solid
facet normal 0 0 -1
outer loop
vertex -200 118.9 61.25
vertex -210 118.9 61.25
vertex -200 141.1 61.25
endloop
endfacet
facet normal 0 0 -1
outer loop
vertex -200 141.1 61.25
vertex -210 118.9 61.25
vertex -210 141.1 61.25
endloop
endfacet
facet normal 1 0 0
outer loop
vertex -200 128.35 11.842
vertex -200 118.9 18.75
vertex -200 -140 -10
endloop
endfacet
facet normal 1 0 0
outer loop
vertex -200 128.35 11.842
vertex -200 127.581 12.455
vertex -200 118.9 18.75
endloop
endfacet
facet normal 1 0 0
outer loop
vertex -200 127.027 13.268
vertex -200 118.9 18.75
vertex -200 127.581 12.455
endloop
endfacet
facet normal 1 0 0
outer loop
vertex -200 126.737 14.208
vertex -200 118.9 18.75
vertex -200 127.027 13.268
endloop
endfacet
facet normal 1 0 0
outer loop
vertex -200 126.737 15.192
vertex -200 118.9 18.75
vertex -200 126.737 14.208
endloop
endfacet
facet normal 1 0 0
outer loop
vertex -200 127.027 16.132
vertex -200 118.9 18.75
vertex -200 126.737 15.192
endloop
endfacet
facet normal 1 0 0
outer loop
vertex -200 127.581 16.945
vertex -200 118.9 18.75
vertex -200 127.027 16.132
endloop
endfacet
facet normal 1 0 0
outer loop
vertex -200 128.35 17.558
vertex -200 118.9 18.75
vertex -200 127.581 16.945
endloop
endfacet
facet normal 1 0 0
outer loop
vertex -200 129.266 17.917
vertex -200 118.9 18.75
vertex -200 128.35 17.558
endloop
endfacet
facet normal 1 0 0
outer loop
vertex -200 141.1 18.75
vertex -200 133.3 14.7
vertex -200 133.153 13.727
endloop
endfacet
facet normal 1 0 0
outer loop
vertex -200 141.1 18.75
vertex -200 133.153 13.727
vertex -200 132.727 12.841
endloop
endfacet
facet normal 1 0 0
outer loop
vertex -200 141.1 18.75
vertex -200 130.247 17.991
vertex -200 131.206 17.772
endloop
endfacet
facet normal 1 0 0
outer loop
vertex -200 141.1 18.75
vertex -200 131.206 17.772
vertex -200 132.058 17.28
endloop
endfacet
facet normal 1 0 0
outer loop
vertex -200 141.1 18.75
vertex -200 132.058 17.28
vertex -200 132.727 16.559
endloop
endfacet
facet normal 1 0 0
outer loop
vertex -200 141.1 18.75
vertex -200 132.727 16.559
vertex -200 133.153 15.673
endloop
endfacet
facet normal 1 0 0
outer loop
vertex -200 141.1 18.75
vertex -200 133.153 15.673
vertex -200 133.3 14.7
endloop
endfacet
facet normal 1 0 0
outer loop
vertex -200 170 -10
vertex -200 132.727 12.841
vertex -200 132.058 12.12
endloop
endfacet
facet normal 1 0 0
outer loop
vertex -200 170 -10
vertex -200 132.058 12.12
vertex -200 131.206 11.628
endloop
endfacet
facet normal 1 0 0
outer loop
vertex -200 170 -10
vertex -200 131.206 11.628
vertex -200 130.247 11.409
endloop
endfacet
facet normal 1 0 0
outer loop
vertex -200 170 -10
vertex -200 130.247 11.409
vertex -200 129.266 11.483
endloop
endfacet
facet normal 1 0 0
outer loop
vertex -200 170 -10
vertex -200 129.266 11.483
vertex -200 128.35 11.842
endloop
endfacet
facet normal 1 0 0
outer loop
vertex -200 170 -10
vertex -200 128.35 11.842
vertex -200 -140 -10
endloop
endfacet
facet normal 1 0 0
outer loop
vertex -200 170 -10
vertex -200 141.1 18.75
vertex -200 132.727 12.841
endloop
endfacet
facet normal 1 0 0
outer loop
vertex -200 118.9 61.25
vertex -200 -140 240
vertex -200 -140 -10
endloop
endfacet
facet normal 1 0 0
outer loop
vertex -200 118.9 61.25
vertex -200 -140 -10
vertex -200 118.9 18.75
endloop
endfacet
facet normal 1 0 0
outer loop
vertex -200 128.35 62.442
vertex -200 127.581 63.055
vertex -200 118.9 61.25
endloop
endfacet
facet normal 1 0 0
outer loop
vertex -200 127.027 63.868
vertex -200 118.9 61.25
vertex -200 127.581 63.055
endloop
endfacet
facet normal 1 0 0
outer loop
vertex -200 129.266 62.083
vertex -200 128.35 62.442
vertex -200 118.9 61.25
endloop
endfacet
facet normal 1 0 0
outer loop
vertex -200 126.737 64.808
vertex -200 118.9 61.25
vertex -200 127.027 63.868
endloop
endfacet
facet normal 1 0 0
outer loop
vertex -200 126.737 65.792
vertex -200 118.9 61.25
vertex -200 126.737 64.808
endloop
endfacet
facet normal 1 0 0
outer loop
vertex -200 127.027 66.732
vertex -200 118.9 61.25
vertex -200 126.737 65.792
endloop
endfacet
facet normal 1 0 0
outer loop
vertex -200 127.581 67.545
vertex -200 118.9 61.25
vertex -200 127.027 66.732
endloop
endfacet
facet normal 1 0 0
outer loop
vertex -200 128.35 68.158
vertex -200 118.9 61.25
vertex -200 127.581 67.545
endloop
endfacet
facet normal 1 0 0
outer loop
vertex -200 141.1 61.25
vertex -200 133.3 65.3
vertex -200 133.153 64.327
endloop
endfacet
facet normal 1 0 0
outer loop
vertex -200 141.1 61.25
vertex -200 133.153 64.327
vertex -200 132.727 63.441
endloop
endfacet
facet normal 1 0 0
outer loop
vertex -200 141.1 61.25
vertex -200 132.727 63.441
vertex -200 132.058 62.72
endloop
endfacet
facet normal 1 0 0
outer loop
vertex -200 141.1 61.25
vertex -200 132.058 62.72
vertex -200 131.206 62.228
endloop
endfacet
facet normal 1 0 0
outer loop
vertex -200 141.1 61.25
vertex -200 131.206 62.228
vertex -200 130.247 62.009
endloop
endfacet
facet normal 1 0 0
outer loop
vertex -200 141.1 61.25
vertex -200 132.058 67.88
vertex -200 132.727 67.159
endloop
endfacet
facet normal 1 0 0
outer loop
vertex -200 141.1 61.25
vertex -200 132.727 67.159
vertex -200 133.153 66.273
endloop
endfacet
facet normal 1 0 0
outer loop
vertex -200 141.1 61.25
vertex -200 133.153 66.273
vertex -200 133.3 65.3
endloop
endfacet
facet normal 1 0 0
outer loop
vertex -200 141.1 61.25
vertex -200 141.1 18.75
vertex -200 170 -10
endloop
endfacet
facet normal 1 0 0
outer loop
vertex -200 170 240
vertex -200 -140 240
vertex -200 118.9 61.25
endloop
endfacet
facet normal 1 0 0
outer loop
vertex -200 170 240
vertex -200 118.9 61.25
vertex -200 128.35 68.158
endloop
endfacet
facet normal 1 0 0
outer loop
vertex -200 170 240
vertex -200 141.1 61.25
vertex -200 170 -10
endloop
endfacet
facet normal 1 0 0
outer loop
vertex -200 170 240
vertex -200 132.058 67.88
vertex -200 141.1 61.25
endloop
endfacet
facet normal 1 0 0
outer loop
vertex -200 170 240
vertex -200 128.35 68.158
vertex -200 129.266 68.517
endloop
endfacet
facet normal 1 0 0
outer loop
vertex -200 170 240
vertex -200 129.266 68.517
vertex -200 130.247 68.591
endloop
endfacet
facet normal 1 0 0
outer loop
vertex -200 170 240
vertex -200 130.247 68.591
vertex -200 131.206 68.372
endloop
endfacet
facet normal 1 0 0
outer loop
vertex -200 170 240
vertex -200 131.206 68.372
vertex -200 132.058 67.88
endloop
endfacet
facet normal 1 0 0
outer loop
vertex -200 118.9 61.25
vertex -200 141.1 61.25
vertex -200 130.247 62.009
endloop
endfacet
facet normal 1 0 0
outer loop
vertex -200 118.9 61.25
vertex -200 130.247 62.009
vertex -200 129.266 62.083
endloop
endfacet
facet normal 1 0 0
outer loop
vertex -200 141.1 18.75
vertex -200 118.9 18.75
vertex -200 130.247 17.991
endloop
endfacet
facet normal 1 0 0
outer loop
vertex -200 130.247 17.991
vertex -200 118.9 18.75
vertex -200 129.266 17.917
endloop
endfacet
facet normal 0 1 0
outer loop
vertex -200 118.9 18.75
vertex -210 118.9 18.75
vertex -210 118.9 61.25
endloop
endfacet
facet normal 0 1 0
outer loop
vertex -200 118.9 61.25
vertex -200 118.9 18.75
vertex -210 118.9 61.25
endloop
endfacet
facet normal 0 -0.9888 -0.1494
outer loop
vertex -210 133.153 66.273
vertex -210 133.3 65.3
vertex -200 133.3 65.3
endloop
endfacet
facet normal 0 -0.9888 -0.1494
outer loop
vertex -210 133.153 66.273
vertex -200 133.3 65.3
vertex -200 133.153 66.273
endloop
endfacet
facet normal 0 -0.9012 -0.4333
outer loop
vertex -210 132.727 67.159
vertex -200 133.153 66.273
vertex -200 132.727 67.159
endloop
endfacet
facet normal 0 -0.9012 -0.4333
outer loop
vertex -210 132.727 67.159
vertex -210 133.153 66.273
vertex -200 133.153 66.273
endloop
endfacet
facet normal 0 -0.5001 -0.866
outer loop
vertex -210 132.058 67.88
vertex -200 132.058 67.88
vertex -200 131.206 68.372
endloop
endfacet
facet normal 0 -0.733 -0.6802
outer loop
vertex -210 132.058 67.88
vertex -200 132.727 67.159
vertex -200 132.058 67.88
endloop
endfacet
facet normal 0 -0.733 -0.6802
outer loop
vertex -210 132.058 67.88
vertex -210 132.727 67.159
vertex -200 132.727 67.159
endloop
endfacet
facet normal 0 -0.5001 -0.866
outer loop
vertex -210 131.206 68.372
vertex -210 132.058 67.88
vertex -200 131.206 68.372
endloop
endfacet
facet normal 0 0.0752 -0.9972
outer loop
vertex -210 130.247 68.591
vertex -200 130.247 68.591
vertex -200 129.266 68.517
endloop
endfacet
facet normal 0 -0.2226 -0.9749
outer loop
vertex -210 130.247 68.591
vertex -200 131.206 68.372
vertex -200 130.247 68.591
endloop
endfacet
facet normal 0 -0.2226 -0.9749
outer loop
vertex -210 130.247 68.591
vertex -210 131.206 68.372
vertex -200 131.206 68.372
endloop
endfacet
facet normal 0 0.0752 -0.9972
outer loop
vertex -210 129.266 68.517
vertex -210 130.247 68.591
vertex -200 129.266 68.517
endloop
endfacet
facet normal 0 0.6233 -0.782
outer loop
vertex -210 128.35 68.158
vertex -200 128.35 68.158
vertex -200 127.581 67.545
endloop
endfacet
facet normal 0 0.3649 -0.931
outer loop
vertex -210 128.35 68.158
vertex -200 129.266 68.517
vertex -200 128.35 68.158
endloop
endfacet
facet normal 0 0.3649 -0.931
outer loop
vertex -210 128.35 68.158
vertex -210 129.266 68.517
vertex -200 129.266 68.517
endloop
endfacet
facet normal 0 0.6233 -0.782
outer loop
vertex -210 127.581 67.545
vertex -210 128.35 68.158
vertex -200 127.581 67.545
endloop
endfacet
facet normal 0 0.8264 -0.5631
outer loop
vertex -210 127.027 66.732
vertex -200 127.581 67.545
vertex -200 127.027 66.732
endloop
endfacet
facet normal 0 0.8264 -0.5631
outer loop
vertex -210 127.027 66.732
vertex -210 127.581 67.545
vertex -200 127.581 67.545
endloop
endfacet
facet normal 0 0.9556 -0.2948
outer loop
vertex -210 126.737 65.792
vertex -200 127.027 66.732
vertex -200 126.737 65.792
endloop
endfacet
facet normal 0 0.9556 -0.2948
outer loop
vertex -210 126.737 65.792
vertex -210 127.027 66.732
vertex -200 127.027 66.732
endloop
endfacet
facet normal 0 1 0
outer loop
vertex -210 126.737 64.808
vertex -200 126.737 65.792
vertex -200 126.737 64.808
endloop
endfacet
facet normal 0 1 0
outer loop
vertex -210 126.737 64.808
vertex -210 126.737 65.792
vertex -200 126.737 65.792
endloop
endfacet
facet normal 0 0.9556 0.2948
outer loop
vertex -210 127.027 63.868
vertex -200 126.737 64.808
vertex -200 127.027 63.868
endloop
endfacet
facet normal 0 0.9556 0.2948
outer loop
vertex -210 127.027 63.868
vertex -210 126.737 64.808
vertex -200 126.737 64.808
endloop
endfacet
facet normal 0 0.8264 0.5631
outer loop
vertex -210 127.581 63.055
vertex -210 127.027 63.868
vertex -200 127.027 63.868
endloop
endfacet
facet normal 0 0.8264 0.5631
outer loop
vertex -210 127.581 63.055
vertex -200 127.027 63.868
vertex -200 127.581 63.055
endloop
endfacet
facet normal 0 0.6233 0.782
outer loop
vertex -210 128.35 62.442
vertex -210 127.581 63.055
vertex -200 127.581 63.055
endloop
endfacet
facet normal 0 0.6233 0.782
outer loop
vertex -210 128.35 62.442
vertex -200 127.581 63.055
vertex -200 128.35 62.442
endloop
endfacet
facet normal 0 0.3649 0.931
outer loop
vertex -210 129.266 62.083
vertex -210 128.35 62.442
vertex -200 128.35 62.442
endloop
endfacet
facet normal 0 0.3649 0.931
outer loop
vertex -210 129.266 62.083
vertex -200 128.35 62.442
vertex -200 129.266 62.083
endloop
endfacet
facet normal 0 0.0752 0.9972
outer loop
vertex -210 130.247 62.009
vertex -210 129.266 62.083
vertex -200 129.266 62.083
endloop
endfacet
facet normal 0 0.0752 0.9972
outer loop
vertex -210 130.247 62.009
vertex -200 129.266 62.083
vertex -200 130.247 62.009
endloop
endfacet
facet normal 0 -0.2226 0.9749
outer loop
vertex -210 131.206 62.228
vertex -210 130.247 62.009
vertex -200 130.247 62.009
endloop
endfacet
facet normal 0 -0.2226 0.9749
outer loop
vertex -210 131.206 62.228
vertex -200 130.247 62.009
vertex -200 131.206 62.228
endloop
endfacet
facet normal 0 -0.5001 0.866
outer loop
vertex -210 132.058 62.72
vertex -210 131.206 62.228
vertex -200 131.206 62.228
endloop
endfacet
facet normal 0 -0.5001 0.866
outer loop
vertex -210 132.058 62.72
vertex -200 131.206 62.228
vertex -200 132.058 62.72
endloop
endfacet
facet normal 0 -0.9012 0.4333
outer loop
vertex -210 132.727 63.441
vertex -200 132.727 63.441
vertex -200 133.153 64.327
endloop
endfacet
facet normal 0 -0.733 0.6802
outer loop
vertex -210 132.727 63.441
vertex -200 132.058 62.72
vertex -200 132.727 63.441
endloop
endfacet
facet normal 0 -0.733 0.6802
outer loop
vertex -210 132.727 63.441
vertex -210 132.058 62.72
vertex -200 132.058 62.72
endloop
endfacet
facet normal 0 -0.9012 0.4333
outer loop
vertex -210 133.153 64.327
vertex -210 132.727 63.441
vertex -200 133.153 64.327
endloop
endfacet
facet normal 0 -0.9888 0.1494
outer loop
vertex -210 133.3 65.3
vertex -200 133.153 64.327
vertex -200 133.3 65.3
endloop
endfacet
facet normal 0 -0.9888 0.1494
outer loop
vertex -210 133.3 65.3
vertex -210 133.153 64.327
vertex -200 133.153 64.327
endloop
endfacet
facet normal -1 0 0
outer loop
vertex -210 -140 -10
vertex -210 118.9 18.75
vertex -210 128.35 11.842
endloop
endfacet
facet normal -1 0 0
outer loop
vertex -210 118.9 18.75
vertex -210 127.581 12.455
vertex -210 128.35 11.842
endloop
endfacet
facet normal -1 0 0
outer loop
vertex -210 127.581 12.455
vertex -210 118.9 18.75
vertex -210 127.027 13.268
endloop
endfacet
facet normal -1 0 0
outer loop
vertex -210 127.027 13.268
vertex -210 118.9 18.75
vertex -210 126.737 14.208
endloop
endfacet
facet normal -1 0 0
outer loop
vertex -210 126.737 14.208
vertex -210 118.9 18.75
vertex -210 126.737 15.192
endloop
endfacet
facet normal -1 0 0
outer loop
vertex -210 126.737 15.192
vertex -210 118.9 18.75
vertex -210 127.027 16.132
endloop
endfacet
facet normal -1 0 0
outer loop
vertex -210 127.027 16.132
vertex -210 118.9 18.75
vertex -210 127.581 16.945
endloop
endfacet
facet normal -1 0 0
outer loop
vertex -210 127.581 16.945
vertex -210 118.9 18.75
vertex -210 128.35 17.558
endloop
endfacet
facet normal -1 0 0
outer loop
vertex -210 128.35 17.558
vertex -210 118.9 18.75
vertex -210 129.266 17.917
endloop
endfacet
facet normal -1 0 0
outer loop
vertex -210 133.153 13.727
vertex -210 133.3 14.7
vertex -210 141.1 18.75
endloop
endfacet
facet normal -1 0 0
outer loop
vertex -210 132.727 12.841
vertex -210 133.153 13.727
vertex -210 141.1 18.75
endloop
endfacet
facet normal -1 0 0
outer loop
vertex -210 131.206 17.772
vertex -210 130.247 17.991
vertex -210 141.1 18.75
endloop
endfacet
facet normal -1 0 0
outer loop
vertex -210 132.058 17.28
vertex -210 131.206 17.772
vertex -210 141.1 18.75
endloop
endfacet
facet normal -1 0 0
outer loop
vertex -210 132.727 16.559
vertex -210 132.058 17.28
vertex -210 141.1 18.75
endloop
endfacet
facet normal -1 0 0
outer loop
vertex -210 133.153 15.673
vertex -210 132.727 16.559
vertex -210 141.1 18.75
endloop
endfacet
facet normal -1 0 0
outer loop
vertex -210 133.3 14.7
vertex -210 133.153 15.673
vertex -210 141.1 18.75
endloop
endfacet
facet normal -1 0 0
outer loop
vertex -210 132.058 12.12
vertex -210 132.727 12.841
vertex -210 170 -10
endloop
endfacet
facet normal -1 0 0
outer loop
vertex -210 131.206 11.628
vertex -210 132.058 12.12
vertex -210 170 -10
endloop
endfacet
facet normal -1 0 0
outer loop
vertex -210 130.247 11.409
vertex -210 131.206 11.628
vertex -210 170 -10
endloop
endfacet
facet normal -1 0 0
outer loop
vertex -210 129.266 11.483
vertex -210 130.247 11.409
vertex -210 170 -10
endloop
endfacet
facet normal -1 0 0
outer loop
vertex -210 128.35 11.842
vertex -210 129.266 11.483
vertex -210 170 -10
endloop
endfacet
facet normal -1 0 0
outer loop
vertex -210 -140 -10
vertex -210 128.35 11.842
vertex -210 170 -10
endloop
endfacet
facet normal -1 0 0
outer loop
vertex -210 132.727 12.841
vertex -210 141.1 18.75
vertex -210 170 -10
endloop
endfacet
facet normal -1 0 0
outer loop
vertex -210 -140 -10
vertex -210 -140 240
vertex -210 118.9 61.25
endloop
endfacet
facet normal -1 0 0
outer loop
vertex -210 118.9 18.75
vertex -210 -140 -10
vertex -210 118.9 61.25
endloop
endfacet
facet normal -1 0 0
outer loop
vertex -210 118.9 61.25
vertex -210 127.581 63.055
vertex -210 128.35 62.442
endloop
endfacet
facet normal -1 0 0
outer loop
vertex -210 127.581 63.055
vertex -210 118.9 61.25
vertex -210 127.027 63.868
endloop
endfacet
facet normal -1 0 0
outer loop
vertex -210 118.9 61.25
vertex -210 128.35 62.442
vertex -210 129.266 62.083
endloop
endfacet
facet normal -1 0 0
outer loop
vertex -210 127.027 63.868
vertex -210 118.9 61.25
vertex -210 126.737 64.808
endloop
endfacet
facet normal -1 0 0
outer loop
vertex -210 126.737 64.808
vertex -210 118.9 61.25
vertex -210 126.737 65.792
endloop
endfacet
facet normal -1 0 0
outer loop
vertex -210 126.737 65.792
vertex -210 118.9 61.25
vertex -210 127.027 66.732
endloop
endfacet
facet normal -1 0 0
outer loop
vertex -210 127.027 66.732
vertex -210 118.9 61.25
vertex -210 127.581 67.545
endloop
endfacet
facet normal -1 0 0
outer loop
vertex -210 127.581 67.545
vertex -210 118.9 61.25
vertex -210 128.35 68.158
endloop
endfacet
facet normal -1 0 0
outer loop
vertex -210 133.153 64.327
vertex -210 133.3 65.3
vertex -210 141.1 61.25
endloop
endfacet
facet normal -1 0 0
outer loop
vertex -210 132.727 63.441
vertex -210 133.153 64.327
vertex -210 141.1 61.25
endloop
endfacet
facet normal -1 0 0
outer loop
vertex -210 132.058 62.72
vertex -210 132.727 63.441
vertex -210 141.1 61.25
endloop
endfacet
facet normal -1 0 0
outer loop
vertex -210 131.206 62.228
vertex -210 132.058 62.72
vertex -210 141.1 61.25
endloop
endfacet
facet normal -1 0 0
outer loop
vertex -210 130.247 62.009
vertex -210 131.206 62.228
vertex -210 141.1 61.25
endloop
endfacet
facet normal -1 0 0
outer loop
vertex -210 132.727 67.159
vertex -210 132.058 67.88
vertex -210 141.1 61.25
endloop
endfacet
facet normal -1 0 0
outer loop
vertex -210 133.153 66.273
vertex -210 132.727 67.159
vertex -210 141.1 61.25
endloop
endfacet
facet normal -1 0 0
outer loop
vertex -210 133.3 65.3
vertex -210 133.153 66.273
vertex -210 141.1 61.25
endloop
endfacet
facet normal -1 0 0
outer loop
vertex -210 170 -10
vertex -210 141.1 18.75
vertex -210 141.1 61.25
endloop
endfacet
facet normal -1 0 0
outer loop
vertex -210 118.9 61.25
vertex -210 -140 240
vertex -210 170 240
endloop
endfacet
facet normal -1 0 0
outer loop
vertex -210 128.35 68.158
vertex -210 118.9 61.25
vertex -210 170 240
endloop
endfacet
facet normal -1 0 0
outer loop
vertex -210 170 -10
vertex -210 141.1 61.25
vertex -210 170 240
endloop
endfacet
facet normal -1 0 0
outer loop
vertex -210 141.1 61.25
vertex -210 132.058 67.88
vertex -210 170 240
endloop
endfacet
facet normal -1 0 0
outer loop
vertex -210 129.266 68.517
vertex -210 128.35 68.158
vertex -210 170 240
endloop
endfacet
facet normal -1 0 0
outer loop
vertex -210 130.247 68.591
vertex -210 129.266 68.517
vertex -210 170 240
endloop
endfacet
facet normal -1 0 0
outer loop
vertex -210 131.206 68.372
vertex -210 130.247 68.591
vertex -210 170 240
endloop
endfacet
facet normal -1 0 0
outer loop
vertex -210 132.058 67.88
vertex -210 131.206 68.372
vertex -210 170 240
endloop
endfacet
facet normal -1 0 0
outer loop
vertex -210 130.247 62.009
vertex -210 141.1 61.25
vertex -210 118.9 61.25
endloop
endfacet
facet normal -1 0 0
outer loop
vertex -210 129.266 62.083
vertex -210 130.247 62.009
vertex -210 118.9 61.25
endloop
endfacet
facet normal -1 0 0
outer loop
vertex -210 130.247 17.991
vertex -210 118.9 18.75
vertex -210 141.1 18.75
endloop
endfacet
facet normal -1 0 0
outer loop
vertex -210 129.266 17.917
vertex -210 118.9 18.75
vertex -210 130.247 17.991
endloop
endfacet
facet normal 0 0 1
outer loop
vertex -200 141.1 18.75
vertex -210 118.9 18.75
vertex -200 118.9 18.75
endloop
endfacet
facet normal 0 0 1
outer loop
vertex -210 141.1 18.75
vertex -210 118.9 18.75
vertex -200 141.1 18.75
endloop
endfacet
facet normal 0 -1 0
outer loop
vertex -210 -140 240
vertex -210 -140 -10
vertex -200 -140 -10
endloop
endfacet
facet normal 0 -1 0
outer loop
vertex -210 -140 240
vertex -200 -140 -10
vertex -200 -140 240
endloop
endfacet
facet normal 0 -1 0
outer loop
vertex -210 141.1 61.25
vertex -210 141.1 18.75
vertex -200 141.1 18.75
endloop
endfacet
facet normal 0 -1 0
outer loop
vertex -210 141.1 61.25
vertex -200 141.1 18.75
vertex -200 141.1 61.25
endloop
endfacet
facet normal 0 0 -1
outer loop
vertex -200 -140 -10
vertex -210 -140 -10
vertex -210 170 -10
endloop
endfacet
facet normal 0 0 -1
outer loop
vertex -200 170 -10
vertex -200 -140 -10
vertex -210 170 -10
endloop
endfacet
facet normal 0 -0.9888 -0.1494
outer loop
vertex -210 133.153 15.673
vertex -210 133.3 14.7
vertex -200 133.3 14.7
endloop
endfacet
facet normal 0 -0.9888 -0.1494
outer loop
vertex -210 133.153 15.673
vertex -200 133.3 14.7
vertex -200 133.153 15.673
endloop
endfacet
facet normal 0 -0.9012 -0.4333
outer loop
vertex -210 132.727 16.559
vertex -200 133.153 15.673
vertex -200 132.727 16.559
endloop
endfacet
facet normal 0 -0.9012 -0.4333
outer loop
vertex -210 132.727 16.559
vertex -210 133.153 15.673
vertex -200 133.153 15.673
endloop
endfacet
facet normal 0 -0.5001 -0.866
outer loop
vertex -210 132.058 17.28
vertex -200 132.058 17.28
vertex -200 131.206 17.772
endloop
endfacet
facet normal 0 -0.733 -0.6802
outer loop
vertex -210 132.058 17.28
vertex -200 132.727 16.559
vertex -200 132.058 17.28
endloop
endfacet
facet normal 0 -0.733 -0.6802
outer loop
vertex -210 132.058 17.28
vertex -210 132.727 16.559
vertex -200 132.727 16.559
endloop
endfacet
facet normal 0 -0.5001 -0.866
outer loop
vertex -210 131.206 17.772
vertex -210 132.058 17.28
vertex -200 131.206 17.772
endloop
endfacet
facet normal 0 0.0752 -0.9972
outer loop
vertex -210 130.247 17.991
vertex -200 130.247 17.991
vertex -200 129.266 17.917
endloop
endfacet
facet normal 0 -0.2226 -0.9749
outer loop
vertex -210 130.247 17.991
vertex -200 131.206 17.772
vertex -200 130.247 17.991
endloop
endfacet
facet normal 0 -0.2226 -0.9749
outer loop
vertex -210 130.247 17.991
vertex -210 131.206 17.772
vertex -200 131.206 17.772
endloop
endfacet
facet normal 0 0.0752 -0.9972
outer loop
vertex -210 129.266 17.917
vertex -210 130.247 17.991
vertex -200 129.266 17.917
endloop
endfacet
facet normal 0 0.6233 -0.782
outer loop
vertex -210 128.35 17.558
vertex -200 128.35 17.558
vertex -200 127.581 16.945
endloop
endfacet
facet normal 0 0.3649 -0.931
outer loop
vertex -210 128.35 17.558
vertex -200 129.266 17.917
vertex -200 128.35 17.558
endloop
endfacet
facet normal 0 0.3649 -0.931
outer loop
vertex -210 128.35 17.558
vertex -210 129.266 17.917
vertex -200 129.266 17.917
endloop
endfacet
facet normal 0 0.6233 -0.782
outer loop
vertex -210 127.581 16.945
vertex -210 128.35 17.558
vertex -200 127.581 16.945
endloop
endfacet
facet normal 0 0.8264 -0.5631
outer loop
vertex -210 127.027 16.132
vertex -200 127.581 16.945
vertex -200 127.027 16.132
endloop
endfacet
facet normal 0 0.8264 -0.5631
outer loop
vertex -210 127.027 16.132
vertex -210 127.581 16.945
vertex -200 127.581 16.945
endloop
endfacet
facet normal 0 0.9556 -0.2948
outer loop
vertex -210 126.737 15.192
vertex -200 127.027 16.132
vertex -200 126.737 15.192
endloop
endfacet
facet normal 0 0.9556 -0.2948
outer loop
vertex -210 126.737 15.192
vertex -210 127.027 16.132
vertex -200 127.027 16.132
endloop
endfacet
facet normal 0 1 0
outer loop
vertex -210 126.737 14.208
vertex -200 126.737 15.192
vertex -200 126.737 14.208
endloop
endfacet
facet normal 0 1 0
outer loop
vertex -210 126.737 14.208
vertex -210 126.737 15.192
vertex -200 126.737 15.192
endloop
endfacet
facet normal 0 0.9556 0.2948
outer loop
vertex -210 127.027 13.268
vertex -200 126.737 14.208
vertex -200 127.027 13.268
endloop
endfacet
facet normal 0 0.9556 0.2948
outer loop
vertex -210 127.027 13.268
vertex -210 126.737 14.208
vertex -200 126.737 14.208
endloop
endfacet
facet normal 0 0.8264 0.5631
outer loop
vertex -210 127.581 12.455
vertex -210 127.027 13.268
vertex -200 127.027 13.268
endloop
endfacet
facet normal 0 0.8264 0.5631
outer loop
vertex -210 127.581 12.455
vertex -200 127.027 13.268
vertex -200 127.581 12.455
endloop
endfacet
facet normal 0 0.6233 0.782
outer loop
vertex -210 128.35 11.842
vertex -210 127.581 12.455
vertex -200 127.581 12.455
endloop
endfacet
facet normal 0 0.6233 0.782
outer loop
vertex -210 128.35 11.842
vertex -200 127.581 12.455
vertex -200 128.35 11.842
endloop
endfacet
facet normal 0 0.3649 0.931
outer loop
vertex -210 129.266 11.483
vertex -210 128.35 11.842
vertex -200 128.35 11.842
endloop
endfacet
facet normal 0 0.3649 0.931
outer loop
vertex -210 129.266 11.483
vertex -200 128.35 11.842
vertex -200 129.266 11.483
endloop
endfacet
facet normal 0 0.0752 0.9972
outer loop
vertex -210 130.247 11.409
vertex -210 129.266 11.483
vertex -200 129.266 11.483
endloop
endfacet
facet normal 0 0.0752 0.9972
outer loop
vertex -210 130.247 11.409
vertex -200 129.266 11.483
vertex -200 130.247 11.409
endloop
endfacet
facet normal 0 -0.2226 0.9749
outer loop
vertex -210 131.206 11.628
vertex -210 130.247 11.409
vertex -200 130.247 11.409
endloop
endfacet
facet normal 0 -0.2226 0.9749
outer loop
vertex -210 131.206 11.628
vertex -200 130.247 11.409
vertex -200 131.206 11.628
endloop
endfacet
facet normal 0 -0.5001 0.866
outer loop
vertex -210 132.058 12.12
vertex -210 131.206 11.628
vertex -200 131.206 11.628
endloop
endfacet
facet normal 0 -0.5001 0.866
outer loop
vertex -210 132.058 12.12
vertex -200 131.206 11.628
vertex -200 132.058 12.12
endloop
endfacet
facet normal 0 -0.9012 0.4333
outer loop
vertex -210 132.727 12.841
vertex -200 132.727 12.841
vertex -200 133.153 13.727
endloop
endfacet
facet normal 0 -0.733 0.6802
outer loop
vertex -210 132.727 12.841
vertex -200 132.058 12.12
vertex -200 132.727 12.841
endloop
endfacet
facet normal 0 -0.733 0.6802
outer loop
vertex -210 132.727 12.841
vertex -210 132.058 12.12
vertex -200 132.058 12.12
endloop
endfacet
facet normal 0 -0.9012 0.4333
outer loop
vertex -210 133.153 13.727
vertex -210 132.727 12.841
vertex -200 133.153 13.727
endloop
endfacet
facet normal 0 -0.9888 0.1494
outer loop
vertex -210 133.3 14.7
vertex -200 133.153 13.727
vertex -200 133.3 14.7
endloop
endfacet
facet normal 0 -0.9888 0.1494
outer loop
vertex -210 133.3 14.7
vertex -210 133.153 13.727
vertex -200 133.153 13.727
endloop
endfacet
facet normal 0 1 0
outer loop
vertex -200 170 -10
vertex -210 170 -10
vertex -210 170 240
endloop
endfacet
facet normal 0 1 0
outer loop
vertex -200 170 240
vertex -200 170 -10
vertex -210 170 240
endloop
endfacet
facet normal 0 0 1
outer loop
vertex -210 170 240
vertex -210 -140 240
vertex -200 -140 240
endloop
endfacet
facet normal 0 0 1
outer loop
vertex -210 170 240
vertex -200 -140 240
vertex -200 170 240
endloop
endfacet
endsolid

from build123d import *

# Parameters (mm, degrees)
SKETCH012_R  = 3.3
SKETCH012_W  = 22.2
SKETCH012_H  = 42.5
PAD012_DEPTH = 30
SKETCH006_W  = 310
SKETCH006_H  = 250
PAD006_DEPTH = 10


with BuildPart() as pad012:
    # Sketch012 → Pad012 (new body)
    with BuildSketch(Plane(origin=(-213, 130, 40), x_dir=(0, 1, 0), z_dir=(1, 0, 0))):
        with Locations((0, 25.3)):
            Circle(SKETCH012_R)
        with Locations((0, -25.3)):
            Circle(SKETCH012_R)
        Rectangle(SKETCH012_W, SKETCH012_H)
    extrude(amount=PAD012_DEPTH)


with BuildPart() as cut004:
    # Sketch006 → Pad006 (new body)
    with BuildSketch(Plane.YZ.offset(-210)):
        with Locations((15, 115)):
            Rectangle(SKETCH006_W, SKETCH006_H)
    extrude(amount=PAD006_DEPTH)

    # Cut004: cut Pad012
    add(pad012.part, mode=Mode.SUBTRACT)


solid = cut004.part
